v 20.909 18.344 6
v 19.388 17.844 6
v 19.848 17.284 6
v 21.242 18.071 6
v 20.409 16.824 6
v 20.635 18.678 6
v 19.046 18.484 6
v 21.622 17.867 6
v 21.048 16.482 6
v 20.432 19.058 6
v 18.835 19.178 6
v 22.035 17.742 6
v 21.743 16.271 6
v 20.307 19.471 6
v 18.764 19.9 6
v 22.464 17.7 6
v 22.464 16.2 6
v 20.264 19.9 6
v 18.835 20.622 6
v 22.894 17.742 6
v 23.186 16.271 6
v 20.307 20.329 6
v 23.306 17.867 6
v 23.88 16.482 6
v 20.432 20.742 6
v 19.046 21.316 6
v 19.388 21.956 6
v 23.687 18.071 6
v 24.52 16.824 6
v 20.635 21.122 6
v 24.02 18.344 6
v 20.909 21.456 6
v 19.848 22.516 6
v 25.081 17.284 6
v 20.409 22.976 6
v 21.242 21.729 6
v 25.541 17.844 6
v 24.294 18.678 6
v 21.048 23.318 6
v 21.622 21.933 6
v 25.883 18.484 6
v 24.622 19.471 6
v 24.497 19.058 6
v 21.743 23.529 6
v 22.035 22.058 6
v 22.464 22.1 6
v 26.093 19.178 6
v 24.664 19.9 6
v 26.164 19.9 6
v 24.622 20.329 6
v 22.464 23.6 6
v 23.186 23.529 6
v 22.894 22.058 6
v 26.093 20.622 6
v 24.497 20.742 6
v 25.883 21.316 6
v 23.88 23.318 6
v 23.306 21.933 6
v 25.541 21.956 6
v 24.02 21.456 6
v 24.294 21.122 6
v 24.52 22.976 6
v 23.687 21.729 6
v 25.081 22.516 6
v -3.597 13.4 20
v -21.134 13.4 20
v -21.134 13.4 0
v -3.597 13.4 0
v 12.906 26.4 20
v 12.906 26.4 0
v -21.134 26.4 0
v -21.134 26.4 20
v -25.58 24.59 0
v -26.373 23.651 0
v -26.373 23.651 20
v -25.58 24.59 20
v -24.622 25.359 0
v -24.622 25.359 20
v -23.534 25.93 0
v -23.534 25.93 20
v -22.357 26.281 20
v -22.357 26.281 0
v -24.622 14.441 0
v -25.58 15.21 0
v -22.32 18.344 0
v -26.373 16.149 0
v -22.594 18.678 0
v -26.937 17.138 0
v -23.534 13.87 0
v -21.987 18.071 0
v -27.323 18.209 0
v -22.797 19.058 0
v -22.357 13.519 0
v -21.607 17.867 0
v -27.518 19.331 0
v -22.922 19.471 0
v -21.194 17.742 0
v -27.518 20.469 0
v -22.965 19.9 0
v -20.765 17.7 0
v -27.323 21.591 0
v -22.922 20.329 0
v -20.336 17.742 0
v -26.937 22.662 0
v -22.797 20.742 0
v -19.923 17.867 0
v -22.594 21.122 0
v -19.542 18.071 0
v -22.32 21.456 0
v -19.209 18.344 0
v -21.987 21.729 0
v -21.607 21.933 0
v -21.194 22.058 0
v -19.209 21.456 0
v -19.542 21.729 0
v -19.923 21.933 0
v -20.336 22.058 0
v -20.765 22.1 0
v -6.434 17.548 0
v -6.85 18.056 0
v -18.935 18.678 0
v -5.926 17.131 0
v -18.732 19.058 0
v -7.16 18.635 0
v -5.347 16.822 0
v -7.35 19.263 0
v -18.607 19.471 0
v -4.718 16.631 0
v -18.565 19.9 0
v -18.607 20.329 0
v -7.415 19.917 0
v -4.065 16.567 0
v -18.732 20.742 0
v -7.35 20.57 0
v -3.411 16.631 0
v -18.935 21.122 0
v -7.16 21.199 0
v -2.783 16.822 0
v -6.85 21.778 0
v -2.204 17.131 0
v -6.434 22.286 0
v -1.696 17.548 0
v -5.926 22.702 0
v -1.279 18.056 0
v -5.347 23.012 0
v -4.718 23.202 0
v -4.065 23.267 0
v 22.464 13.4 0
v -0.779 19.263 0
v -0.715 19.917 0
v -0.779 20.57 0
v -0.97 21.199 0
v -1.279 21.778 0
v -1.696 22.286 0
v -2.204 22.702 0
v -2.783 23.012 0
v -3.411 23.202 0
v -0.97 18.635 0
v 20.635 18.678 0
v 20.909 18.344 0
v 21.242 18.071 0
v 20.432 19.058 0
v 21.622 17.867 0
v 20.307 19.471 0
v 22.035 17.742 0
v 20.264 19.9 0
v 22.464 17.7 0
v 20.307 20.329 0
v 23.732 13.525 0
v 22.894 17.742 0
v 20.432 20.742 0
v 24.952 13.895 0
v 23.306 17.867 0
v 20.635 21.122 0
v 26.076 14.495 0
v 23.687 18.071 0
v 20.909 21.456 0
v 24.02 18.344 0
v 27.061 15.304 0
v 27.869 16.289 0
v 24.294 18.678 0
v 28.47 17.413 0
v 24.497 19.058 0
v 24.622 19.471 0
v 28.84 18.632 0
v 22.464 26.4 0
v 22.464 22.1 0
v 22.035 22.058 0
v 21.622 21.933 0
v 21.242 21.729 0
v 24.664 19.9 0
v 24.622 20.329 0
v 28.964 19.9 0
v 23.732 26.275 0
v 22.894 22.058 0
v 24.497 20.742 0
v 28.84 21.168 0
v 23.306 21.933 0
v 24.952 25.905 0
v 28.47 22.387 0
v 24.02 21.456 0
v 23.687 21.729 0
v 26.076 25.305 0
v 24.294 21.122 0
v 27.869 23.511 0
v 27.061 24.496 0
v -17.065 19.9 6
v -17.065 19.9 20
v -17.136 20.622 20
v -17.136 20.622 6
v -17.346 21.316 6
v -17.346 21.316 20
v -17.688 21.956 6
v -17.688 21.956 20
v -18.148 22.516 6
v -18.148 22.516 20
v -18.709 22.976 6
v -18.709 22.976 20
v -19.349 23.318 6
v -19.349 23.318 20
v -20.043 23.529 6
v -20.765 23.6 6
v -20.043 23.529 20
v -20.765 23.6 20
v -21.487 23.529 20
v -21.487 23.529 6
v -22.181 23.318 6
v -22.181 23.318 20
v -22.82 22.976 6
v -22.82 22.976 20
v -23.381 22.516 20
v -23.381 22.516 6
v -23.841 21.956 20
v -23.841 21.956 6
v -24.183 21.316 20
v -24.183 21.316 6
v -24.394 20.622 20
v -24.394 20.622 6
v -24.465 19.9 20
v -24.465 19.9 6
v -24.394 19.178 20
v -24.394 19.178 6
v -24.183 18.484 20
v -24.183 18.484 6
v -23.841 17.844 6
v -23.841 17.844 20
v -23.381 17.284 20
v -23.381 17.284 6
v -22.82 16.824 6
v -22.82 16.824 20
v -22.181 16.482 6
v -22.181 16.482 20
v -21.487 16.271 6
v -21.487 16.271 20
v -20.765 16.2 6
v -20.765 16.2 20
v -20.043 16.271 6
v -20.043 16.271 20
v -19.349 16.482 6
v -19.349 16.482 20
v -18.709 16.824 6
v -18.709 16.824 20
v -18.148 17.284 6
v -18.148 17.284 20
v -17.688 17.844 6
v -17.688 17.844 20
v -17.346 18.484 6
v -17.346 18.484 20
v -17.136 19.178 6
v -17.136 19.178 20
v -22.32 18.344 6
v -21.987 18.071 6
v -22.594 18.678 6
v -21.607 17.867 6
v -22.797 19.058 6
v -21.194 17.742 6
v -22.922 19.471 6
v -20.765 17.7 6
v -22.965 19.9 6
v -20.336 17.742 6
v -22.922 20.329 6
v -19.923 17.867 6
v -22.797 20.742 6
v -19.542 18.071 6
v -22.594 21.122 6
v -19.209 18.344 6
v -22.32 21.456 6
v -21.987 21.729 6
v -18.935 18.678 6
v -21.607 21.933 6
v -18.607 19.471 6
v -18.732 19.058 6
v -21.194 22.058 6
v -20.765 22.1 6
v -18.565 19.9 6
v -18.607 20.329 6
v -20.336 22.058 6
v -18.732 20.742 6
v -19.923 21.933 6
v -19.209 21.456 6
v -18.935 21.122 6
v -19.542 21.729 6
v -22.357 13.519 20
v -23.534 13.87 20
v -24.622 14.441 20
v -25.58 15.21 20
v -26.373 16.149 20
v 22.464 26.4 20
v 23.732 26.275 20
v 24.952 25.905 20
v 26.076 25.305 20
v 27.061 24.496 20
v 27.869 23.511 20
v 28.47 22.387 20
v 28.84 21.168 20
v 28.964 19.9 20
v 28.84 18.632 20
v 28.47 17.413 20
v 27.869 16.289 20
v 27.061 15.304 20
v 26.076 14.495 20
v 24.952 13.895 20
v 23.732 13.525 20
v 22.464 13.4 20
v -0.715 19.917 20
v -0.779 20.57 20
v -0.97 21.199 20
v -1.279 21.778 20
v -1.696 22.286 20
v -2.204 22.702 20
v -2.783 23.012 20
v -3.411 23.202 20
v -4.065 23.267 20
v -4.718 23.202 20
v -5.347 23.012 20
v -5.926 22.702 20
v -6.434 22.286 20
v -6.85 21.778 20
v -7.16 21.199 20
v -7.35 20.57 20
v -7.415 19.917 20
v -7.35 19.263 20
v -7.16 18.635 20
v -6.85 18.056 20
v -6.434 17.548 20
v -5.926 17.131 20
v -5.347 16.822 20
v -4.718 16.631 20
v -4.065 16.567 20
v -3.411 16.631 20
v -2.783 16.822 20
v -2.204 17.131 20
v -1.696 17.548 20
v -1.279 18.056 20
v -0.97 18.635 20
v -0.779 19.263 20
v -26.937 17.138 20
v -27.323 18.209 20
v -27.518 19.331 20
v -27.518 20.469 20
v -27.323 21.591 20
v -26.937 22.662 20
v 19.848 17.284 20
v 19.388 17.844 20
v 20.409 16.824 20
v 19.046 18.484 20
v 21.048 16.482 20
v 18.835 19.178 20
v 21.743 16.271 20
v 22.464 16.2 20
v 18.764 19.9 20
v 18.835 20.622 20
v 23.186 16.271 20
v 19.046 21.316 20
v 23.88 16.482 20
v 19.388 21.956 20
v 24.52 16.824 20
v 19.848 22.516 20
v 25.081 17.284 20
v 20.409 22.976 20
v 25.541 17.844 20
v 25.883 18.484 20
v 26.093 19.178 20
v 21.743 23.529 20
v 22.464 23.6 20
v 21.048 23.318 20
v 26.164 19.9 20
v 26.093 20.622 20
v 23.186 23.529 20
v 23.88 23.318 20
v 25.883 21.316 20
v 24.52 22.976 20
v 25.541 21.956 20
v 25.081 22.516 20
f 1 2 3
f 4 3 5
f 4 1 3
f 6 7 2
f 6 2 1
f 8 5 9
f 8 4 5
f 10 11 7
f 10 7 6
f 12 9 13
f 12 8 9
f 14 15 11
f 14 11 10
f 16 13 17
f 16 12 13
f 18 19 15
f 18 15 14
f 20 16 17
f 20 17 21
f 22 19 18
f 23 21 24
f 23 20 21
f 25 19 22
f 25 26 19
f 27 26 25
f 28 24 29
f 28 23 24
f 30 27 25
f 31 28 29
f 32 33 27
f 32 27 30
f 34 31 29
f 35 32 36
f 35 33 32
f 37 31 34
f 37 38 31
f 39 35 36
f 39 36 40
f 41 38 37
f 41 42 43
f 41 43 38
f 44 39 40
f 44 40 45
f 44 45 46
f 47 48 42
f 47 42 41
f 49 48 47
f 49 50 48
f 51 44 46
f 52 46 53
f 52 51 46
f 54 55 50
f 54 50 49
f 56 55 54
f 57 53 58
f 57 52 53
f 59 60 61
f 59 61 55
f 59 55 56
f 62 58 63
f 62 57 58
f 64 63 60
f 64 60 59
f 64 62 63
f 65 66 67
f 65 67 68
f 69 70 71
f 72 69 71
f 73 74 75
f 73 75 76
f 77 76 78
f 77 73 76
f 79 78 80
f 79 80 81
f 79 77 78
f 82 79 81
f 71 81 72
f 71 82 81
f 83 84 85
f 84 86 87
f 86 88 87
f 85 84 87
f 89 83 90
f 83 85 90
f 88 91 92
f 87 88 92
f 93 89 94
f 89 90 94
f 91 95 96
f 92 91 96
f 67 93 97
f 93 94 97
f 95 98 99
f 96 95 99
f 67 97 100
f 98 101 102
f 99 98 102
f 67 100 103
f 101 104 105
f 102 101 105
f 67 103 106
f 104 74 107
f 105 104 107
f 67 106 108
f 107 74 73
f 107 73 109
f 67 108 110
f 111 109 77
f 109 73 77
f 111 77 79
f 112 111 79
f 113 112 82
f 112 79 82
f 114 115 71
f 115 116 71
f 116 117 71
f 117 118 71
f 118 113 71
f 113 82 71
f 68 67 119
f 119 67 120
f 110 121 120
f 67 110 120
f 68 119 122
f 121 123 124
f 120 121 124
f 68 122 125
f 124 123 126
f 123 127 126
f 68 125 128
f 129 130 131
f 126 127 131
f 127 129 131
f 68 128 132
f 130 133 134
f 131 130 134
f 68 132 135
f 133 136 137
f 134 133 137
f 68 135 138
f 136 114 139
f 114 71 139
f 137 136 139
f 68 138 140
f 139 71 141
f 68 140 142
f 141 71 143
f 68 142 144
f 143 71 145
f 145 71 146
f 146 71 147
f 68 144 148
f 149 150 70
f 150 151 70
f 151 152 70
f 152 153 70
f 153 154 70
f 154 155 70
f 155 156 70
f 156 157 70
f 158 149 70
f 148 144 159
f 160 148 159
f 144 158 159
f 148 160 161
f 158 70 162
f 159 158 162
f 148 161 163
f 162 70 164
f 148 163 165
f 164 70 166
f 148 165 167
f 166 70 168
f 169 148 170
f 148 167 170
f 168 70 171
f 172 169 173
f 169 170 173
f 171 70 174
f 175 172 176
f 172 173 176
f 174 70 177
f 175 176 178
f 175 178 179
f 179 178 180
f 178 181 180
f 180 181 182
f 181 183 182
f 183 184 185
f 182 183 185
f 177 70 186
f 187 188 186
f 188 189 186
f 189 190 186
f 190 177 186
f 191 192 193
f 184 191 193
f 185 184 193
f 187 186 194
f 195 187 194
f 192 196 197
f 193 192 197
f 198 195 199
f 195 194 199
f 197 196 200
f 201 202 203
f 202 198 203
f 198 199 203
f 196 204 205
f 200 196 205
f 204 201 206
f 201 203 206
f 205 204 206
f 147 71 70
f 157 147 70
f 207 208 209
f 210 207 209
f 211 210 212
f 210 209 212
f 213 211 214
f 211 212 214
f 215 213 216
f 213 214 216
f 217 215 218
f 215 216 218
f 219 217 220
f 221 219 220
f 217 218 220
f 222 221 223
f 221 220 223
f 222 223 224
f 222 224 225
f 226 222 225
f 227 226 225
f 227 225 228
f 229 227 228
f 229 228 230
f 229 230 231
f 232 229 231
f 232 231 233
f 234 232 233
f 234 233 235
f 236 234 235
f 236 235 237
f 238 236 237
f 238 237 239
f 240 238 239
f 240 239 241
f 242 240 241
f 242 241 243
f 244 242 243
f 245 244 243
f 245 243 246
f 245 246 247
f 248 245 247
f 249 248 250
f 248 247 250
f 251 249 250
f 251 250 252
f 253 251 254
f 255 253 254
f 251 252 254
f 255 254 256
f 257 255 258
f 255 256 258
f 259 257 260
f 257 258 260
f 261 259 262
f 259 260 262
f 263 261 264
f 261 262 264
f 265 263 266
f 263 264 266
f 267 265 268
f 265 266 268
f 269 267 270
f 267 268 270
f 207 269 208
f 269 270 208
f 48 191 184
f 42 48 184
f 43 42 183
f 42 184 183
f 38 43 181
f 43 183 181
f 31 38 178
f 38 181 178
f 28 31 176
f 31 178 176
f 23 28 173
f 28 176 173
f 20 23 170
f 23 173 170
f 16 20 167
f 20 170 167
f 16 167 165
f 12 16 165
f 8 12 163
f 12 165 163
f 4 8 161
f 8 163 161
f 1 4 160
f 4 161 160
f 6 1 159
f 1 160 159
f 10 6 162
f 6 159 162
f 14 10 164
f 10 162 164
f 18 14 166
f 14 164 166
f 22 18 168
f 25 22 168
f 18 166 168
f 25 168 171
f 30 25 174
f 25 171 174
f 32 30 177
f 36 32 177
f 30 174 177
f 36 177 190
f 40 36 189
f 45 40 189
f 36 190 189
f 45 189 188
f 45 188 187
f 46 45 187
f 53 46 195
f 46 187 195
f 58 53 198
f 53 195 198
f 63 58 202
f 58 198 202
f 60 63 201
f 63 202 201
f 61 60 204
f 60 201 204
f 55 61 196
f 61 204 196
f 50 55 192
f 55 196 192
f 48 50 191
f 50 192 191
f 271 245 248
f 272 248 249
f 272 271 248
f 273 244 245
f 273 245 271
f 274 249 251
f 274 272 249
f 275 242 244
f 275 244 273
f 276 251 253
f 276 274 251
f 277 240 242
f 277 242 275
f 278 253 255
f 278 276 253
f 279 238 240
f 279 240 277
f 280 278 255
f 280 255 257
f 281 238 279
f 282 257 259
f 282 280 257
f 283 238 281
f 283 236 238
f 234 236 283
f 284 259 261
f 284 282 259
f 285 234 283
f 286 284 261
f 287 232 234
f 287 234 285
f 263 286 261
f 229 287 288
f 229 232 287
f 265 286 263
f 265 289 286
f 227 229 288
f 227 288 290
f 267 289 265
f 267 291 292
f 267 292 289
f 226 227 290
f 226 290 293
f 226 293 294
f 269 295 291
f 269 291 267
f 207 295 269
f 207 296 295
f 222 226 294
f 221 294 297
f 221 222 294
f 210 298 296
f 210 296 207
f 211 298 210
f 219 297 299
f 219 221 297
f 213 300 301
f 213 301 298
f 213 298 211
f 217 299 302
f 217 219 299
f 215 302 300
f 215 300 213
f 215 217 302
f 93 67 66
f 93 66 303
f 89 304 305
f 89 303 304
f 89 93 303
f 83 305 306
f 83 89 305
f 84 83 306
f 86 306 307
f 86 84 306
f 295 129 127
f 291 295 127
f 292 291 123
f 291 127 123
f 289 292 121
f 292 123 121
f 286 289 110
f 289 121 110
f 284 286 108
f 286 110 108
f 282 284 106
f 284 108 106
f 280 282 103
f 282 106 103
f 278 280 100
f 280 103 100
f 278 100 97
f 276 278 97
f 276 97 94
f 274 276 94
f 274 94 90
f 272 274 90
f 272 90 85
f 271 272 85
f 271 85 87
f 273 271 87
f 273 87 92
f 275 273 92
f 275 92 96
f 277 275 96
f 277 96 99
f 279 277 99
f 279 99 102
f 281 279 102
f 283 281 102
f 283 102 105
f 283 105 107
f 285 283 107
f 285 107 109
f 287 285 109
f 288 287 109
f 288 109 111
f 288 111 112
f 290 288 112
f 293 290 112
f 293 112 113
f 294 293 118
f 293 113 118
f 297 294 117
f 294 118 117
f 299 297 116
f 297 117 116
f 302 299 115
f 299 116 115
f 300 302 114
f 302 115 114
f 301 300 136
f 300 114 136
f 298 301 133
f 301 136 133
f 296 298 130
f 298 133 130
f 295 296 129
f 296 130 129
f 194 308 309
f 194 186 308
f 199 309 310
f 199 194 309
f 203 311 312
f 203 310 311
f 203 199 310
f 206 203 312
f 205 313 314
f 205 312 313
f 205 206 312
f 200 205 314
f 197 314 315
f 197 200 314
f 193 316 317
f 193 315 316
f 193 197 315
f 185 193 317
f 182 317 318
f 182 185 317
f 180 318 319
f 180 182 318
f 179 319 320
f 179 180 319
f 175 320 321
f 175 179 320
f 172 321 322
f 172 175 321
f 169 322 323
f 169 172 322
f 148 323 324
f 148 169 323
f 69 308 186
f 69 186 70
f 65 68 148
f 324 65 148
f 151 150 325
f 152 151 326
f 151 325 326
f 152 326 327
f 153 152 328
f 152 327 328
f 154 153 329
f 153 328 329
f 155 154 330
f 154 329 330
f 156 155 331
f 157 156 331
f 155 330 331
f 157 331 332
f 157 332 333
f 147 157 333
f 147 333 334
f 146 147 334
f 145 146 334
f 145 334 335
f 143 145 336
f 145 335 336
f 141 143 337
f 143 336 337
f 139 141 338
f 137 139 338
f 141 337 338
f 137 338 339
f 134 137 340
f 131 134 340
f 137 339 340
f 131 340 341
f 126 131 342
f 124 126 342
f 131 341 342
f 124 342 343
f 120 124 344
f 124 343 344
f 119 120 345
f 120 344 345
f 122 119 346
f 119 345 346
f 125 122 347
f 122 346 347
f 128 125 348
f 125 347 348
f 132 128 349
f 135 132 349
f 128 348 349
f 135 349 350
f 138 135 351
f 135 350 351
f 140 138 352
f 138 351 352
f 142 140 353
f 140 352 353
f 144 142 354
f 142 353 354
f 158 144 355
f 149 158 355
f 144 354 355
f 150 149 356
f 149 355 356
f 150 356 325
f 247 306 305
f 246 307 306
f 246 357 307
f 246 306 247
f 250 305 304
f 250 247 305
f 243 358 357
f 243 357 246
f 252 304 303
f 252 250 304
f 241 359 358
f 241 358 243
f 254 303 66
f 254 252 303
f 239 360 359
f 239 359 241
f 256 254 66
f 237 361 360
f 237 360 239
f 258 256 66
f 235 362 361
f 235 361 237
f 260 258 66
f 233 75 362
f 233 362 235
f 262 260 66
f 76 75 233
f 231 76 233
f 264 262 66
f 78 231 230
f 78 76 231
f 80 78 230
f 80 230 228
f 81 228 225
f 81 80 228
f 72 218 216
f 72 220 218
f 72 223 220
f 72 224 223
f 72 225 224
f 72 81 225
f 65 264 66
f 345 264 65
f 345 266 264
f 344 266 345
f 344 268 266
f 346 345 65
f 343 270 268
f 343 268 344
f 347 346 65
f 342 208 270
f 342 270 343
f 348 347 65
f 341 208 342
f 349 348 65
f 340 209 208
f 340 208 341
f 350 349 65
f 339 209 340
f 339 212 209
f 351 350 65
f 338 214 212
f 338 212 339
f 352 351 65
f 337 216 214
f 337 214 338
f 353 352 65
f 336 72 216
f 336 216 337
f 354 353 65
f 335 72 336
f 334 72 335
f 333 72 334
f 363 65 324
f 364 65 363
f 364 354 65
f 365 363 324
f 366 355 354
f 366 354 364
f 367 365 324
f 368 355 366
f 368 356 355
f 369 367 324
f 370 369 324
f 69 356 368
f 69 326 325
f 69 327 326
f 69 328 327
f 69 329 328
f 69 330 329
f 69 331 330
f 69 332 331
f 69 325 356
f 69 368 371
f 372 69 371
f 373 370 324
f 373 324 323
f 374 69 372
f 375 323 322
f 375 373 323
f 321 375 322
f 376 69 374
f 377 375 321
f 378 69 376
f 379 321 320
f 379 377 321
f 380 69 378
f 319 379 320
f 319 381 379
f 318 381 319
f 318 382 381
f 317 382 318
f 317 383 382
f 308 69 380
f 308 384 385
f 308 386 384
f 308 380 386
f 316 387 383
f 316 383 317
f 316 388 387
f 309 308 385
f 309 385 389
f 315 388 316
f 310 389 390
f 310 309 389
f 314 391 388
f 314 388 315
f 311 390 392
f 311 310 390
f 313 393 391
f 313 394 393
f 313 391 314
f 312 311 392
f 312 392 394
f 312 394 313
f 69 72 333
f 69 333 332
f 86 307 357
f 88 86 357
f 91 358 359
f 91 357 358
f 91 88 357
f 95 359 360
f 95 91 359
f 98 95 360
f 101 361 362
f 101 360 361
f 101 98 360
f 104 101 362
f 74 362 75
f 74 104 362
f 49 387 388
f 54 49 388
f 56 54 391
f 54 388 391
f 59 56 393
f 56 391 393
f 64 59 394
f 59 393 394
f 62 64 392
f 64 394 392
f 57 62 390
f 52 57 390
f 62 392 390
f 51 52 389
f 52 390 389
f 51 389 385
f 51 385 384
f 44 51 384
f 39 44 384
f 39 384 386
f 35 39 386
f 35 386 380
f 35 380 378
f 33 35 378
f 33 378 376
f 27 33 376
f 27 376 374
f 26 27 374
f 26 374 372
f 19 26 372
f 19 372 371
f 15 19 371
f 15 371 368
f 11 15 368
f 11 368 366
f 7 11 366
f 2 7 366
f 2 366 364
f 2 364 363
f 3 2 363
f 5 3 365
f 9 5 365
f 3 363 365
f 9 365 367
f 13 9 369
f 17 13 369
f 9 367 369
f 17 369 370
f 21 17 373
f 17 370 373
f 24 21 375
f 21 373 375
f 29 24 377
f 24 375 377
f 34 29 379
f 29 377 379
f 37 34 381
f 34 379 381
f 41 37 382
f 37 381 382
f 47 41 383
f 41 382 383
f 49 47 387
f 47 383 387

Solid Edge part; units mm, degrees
sketch "Sketch1" plane through (0, 0, 0) normal (0, 0, 1) x (1, 0, 0)
  circle A0 centre (-20.7647, 19.9) radius 2.2
  circle A1 centre (22.4644, 19.9) radius 2.2
  arc A2 (-26.3732, 23.6514) -> (-26.3732, 16.1486) centre (-20.9429, 19.9) ccw
  arc A3 (-26.3732, 16.1486) -> (-21.1336, 13.4) centre (-21.1336, 19.7683) ccw
  line L0 (-21.1336, 13.4) -> (-3.5966, 13.4)
  line L1 (-3.5966, 13.4) -> (2.9921, 13.4)
  line L2 (2.9921, 13.4) -> (22.4644, 13.4)
  arc A4 (22.4644, 13.4) -> (22.4644, 26.4) centre (22.4644, 19.9) ccw
  line L3 (22.4644, 26.4) -> (12.906, 26.4)
  line L4 (12.906, 26.4) -> (-21.1336, 26.4)
  arc A5 (-26.3732, 23.6514) -> (-21.1336, 26.4) centre (-21.1336, 20.0317) cw
extrude "Protrusion1" add sketch "Sketch1" along normal blind 20
sketch "Sketch2" plane through (0.7107, 19.9, 20) normal (0, 0, 1) x (1, 0, 0)
  circle A0 centre (-4.7754, 0.0168) radius 3.35
extrude "ExtrudedCutout_1" cut sketch "Sketch2" against normal blind 67.0154
sketch "Sketch3" plane through (0.7107, 19.9, 20) normal (0, 0, 1) x (1, 0, 0)
  circle A0 centre (-21.4754, 0) radius 3.7
  circle A1 centre (21.7537, 0) radius 3.7
extrude "ExtrudedCutout_2" cut sketch "Sketch3" against normal blind 14
